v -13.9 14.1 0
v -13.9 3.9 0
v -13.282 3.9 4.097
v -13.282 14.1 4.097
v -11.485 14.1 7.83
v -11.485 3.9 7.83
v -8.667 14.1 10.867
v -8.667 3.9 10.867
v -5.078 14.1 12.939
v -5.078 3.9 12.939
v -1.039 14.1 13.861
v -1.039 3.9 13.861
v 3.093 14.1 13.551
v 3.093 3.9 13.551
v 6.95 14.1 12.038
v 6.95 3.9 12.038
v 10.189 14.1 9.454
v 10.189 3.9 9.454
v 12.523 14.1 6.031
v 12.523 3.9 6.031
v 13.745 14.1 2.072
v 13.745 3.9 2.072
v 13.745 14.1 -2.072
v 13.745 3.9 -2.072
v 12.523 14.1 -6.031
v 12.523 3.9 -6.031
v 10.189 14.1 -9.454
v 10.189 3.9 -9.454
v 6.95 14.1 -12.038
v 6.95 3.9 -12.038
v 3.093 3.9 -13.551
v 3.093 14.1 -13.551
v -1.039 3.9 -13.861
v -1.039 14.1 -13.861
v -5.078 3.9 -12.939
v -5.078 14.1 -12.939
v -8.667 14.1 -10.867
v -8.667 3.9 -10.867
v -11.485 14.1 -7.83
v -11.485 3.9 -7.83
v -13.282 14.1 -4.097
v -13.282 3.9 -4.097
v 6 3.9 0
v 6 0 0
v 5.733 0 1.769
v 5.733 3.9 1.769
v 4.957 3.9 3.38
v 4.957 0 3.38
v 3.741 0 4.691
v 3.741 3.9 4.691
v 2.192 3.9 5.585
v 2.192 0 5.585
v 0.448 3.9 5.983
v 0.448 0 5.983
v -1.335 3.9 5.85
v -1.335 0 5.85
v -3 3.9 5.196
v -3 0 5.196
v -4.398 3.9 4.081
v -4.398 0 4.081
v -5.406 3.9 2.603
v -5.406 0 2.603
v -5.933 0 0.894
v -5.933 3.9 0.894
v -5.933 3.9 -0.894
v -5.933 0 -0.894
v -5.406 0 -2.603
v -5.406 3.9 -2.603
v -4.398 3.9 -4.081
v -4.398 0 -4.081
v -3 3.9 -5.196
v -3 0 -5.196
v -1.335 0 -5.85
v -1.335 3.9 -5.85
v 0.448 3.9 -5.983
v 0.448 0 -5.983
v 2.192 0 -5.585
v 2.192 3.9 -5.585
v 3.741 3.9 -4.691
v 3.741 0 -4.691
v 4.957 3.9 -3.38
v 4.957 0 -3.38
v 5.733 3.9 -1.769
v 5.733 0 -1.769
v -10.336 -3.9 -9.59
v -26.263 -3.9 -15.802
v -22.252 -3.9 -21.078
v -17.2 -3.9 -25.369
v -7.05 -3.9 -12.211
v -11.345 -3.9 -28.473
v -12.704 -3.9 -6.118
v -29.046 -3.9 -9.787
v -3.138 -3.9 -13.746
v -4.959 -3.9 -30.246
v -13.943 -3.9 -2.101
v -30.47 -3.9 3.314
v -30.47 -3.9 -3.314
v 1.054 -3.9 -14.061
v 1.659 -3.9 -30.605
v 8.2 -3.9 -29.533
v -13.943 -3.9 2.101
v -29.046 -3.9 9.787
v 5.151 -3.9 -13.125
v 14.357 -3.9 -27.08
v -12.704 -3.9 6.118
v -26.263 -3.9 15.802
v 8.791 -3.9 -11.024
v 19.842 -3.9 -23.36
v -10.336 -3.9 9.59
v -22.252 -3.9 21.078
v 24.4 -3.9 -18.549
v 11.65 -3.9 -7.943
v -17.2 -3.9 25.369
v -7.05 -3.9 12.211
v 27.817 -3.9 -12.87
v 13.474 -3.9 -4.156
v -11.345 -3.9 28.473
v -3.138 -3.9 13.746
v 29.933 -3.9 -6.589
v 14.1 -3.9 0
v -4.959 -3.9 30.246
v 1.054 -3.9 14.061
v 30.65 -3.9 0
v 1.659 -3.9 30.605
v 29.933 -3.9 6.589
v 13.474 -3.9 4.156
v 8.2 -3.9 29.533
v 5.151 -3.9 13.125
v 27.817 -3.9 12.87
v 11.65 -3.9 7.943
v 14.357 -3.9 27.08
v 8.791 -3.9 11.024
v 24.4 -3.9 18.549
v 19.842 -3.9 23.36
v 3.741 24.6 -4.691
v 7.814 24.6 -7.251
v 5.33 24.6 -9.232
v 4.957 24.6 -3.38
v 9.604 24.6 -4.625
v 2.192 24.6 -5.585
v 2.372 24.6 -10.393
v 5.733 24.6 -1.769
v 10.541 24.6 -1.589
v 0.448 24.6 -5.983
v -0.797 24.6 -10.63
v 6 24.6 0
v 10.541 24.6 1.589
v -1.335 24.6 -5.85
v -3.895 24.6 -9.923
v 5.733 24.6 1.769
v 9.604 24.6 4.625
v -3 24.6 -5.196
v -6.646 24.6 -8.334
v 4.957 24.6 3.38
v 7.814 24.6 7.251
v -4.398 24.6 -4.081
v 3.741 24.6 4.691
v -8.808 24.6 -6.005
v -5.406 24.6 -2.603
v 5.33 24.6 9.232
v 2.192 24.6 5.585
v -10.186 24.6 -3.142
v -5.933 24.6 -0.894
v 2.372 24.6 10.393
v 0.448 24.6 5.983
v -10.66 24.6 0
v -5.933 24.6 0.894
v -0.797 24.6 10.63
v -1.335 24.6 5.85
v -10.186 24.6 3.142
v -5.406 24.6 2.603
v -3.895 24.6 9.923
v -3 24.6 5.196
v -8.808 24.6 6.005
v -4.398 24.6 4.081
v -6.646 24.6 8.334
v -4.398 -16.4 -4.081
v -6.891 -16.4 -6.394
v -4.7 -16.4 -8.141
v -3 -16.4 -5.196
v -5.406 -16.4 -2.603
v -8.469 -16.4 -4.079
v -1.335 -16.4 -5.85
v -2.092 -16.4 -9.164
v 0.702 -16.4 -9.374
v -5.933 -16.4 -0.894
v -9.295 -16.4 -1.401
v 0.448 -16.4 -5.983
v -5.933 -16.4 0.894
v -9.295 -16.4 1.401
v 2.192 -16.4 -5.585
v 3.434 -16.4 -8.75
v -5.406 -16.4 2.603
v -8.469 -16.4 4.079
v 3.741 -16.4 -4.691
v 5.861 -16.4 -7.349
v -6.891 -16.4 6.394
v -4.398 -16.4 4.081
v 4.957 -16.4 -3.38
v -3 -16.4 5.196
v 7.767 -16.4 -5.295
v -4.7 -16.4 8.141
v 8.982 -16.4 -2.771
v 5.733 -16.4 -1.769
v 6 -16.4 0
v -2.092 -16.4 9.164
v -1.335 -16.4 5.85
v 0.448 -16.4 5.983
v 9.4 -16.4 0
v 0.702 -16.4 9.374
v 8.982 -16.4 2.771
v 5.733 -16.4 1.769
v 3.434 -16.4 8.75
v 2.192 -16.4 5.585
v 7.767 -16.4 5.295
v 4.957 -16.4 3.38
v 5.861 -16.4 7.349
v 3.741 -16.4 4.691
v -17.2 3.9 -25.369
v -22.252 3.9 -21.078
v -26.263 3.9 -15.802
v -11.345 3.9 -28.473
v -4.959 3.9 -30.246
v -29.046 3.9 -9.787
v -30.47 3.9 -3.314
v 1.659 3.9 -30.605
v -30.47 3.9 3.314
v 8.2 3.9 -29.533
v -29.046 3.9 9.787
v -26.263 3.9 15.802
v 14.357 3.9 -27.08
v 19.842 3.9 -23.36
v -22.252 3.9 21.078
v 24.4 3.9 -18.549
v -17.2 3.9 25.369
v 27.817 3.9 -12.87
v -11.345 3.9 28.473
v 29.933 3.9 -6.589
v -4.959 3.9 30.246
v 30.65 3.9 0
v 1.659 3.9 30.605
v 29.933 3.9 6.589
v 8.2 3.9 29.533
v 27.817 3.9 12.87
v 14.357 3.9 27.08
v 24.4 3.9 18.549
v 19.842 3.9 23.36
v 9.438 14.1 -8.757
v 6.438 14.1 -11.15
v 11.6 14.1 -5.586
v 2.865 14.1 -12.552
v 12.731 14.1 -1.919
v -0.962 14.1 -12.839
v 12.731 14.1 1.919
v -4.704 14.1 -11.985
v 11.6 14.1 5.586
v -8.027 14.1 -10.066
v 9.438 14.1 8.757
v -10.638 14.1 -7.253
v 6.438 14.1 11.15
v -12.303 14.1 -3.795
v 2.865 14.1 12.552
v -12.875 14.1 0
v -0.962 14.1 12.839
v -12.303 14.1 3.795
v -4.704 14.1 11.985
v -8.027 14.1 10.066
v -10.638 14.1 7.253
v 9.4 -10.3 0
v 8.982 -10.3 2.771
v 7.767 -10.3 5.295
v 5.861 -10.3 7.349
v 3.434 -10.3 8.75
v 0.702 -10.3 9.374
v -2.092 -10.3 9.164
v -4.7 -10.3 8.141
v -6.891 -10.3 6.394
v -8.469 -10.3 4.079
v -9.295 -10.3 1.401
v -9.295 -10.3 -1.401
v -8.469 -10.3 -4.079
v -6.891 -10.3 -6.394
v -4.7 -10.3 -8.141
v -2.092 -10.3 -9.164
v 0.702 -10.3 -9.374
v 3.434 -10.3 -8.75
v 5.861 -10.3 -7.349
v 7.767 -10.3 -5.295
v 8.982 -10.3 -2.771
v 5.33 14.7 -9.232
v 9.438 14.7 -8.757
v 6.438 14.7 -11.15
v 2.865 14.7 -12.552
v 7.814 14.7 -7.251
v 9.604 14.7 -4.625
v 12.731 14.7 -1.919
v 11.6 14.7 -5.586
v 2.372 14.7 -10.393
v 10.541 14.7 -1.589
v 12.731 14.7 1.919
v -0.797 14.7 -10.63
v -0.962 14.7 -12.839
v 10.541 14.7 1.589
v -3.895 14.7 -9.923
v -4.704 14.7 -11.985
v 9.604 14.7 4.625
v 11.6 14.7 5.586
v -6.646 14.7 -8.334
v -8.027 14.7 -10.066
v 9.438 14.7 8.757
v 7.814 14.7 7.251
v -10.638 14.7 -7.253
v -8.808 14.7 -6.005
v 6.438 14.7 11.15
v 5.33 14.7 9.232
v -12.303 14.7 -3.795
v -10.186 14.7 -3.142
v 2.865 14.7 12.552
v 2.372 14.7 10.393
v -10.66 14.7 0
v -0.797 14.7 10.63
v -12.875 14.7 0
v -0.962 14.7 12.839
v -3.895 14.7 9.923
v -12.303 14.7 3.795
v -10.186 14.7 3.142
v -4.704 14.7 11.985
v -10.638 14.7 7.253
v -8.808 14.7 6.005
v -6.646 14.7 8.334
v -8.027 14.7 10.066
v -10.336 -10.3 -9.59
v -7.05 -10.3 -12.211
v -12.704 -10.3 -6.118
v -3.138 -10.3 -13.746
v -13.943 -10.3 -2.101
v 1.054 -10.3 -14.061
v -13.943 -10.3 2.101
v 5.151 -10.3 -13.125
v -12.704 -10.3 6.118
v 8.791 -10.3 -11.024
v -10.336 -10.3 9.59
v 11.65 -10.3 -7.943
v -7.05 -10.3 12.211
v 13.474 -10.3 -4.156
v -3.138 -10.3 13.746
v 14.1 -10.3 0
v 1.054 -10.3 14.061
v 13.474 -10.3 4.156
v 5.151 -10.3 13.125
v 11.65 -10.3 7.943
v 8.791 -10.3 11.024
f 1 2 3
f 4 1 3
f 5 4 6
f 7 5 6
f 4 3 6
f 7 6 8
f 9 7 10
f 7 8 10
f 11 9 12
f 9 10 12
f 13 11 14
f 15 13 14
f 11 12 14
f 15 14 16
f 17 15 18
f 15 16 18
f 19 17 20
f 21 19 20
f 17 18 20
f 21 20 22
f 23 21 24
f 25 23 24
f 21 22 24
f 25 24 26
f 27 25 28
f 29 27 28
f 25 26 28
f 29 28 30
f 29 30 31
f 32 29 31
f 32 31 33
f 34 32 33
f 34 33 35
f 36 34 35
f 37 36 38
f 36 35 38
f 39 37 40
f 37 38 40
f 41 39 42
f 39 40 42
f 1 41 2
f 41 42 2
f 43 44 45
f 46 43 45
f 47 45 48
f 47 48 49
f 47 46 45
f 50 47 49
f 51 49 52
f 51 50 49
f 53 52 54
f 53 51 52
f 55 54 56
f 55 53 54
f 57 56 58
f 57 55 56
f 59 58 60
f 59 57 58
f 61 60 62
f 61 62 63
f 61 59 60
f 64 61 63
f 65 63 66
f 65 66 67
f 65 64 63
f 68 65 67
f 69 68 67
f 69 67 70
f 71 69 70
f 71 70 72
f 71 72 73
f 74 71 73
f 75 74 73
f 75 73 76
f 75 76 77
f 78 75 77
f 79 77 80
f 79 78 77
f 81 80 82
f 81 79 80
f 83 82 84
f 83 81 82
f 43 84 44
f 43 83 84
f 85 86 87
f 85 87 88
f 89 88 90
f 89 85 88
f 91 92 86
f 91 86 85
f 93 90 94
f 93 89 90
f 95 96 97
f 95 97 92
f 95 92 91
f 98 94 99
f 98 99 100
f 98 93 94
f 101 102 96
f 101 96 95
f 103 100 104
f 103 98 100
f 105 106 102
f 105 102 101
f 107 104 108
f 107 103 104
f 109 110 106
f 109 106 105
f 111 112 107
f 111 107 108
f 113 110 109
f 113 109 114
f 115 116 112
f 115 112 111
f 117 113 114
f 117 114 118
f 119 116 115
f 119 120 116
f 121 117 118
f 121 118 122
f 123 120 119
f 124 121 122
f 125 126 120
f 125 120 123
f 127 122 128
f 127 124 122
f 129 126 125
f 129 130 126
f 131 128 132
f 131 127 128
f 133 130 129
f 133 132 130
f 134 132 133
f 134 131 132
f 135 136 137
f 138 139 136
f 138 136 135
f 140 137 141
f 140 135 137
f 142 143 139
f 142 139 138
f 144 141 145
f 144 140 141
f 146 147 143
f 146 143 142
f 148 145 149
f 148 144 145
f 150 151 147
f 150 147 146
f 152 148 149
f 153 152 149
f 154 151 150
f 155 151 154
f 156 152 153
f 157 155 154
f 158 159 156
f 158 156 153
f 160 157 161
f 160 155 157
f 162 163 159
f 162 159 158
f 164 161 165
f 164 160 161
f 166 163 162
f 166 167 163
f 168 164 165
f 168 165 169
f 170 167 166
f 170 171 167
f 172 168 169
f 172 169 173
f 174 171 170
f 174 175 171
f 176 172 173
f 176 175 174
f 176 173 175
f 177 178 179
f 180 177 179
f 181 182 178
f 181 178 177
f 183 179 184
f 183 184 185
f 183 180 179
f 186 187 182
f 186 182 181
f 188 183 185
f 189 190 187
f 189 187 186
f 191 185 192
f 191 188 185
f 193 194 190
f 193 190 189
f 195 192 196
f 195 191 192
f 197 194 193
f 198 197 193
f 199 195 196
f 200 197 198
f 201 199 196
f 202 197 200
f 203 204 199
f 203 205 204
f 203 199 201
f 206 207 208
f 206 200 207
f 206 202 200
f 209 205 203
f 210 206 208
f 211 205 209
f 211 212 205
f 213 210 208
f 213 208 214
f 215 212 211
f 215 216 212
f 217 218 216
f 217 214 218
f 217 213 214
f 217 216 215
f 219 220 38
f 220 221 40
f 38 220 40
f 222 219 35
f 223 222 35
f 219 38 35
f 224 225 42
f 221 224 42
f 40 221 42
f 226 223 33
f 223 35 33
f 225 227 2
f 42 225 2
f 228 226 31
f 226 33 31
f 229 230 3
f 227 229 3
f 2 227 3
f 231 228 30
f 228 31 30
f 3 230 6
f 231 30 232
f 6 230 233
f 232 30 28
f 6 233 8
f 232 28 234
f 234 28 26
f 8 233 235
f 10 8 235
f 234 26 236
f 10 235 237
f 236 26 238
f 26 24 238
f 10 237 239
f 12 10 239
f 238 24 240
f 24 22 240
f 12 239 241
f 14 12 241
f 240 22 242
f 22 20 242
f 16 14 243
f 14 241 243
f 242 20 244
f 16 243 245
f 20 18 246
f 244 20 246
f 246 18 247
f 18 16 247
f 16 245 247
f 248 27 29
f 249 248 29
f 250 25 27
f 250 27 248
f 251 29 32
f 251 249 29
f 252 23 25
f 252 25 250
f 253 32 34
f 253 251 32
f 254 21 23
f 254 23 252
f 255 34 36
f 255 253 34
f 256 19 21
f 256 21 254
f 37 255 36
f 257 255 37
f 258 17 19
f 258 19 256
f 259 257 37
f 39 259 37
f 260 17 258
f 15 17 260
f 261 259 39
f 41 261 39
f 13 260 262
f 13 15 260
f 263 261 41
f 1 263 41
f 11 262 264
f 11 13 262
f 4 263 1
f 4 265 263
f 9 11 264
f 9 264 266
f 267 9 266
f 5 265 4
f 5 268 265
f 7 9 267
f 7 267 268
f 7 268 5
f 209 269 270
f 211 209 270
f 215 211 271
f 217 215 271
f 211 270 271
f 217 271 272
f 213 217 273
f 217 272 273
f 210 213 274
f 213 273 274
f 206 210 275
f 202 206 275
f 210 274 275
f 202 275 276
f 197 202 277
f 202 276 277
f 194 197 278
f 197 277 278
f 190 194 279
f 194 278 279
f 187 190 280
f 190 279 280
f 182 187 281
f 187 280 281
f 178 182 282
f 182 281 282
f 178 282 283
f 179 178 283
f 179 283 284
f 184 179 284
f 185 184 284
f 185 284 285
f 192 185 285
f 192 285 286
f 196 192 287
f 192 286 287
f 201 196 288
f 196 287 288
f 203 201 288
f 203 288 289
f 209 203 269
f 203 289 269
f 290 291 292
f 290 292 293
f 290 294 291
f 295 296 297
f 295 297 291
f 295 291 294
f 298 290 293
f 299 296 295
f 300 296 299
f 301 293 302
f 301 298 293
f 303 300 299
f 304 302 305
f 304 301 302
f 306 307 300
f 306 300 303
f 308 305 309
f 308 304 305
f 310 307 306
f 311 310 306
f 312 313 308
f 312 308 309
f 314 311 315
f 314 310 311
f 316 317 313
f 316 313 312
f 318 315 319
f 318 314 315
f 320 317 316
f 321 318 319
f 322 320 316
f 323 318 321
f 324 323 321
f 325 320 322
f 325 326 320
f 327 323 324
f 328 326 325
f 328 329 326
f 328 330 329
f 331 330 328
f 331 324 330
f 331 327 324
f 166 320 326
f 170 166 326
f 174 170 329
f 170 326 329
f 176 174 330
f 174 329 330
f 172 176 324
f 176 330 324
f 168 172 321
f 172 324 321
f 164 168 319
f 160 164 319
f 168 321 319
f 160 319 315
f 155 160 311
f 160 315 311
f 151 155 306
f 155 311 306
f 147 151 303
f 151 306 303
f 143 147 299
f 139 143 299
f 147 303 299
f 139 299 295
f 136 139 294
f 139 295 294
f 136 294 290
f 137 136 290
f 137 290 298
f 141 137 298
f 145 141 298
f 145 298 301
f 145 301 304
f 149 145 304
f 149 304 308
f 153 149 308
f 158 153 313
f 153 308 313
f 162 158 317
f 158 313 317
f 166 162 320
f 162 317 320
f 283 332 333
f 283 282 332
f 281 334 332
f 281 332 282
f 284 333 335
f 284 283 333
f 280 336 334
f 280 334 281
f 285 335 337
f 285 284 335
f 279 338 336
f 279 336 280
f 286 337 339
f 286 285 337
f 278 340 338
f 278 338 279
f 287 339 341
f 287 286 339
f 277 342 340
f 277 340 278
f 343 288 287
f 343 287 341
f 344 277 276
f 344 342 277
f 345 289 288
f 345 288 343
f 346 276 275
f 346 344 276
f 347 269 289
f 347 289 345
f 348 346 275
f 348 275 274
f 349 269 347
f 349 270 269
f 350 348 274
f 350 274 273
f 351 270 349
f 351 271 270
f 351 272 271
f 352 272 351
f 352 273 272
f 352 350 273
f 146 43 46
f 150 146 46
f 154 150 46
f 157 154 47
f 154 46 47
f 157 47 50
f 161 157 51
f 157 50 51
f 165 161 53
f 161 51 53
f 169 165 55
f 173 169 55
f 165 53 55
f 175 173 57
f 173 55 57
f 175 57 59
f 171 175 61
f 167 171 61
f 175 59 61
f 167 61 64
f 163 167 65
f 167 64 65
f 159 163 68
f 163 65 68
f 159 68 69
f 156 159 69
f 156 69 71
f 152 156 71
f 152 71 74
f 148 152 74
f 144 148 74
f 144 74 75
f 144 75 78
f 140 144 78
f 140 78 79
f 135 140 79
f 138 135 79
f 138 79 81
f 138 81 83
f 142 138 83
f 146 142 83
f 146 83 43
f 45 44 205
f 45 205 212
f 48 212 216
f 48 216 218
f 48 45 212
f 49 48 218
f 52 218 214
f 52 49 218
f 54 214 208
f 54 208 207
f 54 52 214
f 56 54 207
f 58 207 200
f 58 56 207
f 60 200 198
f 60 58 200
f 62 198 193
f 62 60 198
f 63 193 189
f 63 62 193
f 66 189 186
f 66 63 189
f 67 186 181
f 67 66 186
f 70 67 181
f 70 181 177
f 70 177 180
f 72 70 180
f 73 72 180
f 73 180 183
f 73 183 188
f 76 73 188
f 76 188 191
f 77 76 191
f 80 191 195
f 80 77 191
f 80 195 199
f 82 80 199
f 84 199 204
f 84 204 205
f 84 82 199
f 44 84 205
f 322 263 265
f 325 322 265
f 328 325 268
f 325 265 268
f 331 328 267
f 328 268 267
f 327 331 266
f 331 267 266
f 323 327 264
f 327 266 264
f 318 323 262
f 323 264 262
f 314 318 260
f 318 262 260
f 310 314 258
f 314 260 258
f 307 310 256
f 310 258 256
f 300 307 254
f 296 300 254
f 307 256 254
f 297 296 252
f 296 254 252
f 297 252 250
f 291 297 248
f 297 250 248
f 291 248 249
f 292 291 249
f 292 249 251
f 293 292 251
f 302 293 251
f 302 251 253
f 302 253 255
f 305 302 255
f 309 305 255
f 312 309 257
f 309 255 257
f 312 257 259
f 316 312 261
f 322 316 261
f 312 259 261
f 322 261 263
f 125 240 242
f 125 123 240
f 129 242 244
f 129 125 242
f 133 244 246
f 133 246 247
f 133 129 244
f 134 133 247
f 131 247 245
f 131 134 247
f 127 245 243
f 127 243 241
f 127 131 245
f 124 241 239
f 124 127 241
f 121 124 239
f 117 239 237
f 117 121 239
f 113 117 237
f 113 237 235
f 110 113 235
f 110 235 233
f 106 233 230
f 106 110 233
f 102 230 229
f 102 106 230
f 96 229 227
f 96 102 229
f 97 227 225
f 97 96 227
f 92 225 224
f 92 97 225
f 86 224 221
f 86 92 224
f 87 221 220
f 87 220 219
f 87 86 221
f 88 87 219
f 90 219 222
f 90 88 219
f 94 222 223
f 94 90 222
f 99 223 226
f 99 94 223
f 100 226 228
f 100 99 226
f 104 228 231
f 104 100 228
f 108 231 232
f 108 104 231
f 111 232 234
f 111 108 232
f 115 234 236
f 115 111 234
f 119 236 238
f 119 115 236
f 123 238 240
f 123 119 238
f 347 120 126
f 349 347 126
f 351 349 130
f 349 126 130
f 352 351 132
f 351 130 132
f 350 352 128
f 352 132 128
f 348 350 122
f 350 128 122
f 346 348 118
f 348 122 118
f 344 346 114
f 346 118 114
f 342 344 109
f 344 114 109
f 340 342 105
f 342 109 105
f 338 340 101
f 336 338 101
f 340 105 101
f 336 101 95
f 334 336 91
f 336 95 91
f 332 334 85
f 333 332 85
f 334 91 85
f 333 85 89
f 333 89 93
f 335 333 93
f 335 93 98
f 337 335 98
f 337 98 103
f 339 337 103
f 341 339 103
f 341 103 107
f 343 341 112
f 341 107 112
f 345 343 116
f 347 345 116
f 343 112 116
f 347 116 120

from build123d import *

# Parameters (mm, degrees)
F0_R      = 30.65
F0_R_2    = 6
F1_DEPTH  = 3.9
F2_R      = 14.1
F2_R_2    = 6
F3_DEPTH  = 6.4
F4_R      = 9.4
F4_R_2    = 6
F5_DEPTH  = 6.1
F6_R      = 13.9
F7_DEPTH  = 10.2
F8_R      = 12.875
F9_DEPTH  = 0.6
F10_R     = 10.66
F11_DEPTH = 9.9
F12_DEPTH = 24.601


with BuildPart() as f1:
    # F0 (on Front) → F1 (new body, symmetric)
    with BuildSketch(Plane.XZ):
        Circle(F0_R)
        Circle(F0_R_2, mode=Mode.SUBTRACT)
    extrude(amount=F1_DEPTH, both=True)

    # F2 (on face) → F3 (join)
    with BuildSketch(Plane.XZ.offset(3.9)):
        Circle(F2_R)
        Circle(F2_R_2, mode=Mode.SUBTRACT)
    extrude(amount=F3_DEPTH)

    # F4 (on face) → F5 (join)
    with BuildSketch(Plane.XZ.offset(10.3)):
        Circle(F4_R)
        Circle(F4_R_2, mode=Mode.SUBTRACT)
    extrude(amount=F5_DEPTH)

    # F6 (on face) → F7 (join)
    with BuildSketch(Plane(origin=(0, 3.9, 0), x_dir=(-1, 0, 0), z_dir=(0, 1, 0))):
        Circle(F6_R)
    extrude(amount=F7_DEPTH)

    # F8 (on face) → F9 (join)
    with BuildSketch(Plane(origin=(0, 14.1, 0), x_dir=(-1, 0, 0), z_dir=(0, 1, 0))):
        Circle(F8_R)
    extrude(amount=F9_DEPTH)

    # F10 (on face) → F11 (join)
    with BuildSketch(Plane(origin=(0, 14.7, 0), x_dir=(-1, 0, 0), z_dir=(0, 1, 0))):
        Circle(F10_R)
    extrude(amount=F11_DEPTH)

    # F0 (on Front) → F12 (cut, through all)
    with BuildSketch(Plane.XZ):
        Circle(F0_R_2)
    extrude(amount=-F12_DEPTH, mode=Mode.SUBTRACT)


solid = f1.part
